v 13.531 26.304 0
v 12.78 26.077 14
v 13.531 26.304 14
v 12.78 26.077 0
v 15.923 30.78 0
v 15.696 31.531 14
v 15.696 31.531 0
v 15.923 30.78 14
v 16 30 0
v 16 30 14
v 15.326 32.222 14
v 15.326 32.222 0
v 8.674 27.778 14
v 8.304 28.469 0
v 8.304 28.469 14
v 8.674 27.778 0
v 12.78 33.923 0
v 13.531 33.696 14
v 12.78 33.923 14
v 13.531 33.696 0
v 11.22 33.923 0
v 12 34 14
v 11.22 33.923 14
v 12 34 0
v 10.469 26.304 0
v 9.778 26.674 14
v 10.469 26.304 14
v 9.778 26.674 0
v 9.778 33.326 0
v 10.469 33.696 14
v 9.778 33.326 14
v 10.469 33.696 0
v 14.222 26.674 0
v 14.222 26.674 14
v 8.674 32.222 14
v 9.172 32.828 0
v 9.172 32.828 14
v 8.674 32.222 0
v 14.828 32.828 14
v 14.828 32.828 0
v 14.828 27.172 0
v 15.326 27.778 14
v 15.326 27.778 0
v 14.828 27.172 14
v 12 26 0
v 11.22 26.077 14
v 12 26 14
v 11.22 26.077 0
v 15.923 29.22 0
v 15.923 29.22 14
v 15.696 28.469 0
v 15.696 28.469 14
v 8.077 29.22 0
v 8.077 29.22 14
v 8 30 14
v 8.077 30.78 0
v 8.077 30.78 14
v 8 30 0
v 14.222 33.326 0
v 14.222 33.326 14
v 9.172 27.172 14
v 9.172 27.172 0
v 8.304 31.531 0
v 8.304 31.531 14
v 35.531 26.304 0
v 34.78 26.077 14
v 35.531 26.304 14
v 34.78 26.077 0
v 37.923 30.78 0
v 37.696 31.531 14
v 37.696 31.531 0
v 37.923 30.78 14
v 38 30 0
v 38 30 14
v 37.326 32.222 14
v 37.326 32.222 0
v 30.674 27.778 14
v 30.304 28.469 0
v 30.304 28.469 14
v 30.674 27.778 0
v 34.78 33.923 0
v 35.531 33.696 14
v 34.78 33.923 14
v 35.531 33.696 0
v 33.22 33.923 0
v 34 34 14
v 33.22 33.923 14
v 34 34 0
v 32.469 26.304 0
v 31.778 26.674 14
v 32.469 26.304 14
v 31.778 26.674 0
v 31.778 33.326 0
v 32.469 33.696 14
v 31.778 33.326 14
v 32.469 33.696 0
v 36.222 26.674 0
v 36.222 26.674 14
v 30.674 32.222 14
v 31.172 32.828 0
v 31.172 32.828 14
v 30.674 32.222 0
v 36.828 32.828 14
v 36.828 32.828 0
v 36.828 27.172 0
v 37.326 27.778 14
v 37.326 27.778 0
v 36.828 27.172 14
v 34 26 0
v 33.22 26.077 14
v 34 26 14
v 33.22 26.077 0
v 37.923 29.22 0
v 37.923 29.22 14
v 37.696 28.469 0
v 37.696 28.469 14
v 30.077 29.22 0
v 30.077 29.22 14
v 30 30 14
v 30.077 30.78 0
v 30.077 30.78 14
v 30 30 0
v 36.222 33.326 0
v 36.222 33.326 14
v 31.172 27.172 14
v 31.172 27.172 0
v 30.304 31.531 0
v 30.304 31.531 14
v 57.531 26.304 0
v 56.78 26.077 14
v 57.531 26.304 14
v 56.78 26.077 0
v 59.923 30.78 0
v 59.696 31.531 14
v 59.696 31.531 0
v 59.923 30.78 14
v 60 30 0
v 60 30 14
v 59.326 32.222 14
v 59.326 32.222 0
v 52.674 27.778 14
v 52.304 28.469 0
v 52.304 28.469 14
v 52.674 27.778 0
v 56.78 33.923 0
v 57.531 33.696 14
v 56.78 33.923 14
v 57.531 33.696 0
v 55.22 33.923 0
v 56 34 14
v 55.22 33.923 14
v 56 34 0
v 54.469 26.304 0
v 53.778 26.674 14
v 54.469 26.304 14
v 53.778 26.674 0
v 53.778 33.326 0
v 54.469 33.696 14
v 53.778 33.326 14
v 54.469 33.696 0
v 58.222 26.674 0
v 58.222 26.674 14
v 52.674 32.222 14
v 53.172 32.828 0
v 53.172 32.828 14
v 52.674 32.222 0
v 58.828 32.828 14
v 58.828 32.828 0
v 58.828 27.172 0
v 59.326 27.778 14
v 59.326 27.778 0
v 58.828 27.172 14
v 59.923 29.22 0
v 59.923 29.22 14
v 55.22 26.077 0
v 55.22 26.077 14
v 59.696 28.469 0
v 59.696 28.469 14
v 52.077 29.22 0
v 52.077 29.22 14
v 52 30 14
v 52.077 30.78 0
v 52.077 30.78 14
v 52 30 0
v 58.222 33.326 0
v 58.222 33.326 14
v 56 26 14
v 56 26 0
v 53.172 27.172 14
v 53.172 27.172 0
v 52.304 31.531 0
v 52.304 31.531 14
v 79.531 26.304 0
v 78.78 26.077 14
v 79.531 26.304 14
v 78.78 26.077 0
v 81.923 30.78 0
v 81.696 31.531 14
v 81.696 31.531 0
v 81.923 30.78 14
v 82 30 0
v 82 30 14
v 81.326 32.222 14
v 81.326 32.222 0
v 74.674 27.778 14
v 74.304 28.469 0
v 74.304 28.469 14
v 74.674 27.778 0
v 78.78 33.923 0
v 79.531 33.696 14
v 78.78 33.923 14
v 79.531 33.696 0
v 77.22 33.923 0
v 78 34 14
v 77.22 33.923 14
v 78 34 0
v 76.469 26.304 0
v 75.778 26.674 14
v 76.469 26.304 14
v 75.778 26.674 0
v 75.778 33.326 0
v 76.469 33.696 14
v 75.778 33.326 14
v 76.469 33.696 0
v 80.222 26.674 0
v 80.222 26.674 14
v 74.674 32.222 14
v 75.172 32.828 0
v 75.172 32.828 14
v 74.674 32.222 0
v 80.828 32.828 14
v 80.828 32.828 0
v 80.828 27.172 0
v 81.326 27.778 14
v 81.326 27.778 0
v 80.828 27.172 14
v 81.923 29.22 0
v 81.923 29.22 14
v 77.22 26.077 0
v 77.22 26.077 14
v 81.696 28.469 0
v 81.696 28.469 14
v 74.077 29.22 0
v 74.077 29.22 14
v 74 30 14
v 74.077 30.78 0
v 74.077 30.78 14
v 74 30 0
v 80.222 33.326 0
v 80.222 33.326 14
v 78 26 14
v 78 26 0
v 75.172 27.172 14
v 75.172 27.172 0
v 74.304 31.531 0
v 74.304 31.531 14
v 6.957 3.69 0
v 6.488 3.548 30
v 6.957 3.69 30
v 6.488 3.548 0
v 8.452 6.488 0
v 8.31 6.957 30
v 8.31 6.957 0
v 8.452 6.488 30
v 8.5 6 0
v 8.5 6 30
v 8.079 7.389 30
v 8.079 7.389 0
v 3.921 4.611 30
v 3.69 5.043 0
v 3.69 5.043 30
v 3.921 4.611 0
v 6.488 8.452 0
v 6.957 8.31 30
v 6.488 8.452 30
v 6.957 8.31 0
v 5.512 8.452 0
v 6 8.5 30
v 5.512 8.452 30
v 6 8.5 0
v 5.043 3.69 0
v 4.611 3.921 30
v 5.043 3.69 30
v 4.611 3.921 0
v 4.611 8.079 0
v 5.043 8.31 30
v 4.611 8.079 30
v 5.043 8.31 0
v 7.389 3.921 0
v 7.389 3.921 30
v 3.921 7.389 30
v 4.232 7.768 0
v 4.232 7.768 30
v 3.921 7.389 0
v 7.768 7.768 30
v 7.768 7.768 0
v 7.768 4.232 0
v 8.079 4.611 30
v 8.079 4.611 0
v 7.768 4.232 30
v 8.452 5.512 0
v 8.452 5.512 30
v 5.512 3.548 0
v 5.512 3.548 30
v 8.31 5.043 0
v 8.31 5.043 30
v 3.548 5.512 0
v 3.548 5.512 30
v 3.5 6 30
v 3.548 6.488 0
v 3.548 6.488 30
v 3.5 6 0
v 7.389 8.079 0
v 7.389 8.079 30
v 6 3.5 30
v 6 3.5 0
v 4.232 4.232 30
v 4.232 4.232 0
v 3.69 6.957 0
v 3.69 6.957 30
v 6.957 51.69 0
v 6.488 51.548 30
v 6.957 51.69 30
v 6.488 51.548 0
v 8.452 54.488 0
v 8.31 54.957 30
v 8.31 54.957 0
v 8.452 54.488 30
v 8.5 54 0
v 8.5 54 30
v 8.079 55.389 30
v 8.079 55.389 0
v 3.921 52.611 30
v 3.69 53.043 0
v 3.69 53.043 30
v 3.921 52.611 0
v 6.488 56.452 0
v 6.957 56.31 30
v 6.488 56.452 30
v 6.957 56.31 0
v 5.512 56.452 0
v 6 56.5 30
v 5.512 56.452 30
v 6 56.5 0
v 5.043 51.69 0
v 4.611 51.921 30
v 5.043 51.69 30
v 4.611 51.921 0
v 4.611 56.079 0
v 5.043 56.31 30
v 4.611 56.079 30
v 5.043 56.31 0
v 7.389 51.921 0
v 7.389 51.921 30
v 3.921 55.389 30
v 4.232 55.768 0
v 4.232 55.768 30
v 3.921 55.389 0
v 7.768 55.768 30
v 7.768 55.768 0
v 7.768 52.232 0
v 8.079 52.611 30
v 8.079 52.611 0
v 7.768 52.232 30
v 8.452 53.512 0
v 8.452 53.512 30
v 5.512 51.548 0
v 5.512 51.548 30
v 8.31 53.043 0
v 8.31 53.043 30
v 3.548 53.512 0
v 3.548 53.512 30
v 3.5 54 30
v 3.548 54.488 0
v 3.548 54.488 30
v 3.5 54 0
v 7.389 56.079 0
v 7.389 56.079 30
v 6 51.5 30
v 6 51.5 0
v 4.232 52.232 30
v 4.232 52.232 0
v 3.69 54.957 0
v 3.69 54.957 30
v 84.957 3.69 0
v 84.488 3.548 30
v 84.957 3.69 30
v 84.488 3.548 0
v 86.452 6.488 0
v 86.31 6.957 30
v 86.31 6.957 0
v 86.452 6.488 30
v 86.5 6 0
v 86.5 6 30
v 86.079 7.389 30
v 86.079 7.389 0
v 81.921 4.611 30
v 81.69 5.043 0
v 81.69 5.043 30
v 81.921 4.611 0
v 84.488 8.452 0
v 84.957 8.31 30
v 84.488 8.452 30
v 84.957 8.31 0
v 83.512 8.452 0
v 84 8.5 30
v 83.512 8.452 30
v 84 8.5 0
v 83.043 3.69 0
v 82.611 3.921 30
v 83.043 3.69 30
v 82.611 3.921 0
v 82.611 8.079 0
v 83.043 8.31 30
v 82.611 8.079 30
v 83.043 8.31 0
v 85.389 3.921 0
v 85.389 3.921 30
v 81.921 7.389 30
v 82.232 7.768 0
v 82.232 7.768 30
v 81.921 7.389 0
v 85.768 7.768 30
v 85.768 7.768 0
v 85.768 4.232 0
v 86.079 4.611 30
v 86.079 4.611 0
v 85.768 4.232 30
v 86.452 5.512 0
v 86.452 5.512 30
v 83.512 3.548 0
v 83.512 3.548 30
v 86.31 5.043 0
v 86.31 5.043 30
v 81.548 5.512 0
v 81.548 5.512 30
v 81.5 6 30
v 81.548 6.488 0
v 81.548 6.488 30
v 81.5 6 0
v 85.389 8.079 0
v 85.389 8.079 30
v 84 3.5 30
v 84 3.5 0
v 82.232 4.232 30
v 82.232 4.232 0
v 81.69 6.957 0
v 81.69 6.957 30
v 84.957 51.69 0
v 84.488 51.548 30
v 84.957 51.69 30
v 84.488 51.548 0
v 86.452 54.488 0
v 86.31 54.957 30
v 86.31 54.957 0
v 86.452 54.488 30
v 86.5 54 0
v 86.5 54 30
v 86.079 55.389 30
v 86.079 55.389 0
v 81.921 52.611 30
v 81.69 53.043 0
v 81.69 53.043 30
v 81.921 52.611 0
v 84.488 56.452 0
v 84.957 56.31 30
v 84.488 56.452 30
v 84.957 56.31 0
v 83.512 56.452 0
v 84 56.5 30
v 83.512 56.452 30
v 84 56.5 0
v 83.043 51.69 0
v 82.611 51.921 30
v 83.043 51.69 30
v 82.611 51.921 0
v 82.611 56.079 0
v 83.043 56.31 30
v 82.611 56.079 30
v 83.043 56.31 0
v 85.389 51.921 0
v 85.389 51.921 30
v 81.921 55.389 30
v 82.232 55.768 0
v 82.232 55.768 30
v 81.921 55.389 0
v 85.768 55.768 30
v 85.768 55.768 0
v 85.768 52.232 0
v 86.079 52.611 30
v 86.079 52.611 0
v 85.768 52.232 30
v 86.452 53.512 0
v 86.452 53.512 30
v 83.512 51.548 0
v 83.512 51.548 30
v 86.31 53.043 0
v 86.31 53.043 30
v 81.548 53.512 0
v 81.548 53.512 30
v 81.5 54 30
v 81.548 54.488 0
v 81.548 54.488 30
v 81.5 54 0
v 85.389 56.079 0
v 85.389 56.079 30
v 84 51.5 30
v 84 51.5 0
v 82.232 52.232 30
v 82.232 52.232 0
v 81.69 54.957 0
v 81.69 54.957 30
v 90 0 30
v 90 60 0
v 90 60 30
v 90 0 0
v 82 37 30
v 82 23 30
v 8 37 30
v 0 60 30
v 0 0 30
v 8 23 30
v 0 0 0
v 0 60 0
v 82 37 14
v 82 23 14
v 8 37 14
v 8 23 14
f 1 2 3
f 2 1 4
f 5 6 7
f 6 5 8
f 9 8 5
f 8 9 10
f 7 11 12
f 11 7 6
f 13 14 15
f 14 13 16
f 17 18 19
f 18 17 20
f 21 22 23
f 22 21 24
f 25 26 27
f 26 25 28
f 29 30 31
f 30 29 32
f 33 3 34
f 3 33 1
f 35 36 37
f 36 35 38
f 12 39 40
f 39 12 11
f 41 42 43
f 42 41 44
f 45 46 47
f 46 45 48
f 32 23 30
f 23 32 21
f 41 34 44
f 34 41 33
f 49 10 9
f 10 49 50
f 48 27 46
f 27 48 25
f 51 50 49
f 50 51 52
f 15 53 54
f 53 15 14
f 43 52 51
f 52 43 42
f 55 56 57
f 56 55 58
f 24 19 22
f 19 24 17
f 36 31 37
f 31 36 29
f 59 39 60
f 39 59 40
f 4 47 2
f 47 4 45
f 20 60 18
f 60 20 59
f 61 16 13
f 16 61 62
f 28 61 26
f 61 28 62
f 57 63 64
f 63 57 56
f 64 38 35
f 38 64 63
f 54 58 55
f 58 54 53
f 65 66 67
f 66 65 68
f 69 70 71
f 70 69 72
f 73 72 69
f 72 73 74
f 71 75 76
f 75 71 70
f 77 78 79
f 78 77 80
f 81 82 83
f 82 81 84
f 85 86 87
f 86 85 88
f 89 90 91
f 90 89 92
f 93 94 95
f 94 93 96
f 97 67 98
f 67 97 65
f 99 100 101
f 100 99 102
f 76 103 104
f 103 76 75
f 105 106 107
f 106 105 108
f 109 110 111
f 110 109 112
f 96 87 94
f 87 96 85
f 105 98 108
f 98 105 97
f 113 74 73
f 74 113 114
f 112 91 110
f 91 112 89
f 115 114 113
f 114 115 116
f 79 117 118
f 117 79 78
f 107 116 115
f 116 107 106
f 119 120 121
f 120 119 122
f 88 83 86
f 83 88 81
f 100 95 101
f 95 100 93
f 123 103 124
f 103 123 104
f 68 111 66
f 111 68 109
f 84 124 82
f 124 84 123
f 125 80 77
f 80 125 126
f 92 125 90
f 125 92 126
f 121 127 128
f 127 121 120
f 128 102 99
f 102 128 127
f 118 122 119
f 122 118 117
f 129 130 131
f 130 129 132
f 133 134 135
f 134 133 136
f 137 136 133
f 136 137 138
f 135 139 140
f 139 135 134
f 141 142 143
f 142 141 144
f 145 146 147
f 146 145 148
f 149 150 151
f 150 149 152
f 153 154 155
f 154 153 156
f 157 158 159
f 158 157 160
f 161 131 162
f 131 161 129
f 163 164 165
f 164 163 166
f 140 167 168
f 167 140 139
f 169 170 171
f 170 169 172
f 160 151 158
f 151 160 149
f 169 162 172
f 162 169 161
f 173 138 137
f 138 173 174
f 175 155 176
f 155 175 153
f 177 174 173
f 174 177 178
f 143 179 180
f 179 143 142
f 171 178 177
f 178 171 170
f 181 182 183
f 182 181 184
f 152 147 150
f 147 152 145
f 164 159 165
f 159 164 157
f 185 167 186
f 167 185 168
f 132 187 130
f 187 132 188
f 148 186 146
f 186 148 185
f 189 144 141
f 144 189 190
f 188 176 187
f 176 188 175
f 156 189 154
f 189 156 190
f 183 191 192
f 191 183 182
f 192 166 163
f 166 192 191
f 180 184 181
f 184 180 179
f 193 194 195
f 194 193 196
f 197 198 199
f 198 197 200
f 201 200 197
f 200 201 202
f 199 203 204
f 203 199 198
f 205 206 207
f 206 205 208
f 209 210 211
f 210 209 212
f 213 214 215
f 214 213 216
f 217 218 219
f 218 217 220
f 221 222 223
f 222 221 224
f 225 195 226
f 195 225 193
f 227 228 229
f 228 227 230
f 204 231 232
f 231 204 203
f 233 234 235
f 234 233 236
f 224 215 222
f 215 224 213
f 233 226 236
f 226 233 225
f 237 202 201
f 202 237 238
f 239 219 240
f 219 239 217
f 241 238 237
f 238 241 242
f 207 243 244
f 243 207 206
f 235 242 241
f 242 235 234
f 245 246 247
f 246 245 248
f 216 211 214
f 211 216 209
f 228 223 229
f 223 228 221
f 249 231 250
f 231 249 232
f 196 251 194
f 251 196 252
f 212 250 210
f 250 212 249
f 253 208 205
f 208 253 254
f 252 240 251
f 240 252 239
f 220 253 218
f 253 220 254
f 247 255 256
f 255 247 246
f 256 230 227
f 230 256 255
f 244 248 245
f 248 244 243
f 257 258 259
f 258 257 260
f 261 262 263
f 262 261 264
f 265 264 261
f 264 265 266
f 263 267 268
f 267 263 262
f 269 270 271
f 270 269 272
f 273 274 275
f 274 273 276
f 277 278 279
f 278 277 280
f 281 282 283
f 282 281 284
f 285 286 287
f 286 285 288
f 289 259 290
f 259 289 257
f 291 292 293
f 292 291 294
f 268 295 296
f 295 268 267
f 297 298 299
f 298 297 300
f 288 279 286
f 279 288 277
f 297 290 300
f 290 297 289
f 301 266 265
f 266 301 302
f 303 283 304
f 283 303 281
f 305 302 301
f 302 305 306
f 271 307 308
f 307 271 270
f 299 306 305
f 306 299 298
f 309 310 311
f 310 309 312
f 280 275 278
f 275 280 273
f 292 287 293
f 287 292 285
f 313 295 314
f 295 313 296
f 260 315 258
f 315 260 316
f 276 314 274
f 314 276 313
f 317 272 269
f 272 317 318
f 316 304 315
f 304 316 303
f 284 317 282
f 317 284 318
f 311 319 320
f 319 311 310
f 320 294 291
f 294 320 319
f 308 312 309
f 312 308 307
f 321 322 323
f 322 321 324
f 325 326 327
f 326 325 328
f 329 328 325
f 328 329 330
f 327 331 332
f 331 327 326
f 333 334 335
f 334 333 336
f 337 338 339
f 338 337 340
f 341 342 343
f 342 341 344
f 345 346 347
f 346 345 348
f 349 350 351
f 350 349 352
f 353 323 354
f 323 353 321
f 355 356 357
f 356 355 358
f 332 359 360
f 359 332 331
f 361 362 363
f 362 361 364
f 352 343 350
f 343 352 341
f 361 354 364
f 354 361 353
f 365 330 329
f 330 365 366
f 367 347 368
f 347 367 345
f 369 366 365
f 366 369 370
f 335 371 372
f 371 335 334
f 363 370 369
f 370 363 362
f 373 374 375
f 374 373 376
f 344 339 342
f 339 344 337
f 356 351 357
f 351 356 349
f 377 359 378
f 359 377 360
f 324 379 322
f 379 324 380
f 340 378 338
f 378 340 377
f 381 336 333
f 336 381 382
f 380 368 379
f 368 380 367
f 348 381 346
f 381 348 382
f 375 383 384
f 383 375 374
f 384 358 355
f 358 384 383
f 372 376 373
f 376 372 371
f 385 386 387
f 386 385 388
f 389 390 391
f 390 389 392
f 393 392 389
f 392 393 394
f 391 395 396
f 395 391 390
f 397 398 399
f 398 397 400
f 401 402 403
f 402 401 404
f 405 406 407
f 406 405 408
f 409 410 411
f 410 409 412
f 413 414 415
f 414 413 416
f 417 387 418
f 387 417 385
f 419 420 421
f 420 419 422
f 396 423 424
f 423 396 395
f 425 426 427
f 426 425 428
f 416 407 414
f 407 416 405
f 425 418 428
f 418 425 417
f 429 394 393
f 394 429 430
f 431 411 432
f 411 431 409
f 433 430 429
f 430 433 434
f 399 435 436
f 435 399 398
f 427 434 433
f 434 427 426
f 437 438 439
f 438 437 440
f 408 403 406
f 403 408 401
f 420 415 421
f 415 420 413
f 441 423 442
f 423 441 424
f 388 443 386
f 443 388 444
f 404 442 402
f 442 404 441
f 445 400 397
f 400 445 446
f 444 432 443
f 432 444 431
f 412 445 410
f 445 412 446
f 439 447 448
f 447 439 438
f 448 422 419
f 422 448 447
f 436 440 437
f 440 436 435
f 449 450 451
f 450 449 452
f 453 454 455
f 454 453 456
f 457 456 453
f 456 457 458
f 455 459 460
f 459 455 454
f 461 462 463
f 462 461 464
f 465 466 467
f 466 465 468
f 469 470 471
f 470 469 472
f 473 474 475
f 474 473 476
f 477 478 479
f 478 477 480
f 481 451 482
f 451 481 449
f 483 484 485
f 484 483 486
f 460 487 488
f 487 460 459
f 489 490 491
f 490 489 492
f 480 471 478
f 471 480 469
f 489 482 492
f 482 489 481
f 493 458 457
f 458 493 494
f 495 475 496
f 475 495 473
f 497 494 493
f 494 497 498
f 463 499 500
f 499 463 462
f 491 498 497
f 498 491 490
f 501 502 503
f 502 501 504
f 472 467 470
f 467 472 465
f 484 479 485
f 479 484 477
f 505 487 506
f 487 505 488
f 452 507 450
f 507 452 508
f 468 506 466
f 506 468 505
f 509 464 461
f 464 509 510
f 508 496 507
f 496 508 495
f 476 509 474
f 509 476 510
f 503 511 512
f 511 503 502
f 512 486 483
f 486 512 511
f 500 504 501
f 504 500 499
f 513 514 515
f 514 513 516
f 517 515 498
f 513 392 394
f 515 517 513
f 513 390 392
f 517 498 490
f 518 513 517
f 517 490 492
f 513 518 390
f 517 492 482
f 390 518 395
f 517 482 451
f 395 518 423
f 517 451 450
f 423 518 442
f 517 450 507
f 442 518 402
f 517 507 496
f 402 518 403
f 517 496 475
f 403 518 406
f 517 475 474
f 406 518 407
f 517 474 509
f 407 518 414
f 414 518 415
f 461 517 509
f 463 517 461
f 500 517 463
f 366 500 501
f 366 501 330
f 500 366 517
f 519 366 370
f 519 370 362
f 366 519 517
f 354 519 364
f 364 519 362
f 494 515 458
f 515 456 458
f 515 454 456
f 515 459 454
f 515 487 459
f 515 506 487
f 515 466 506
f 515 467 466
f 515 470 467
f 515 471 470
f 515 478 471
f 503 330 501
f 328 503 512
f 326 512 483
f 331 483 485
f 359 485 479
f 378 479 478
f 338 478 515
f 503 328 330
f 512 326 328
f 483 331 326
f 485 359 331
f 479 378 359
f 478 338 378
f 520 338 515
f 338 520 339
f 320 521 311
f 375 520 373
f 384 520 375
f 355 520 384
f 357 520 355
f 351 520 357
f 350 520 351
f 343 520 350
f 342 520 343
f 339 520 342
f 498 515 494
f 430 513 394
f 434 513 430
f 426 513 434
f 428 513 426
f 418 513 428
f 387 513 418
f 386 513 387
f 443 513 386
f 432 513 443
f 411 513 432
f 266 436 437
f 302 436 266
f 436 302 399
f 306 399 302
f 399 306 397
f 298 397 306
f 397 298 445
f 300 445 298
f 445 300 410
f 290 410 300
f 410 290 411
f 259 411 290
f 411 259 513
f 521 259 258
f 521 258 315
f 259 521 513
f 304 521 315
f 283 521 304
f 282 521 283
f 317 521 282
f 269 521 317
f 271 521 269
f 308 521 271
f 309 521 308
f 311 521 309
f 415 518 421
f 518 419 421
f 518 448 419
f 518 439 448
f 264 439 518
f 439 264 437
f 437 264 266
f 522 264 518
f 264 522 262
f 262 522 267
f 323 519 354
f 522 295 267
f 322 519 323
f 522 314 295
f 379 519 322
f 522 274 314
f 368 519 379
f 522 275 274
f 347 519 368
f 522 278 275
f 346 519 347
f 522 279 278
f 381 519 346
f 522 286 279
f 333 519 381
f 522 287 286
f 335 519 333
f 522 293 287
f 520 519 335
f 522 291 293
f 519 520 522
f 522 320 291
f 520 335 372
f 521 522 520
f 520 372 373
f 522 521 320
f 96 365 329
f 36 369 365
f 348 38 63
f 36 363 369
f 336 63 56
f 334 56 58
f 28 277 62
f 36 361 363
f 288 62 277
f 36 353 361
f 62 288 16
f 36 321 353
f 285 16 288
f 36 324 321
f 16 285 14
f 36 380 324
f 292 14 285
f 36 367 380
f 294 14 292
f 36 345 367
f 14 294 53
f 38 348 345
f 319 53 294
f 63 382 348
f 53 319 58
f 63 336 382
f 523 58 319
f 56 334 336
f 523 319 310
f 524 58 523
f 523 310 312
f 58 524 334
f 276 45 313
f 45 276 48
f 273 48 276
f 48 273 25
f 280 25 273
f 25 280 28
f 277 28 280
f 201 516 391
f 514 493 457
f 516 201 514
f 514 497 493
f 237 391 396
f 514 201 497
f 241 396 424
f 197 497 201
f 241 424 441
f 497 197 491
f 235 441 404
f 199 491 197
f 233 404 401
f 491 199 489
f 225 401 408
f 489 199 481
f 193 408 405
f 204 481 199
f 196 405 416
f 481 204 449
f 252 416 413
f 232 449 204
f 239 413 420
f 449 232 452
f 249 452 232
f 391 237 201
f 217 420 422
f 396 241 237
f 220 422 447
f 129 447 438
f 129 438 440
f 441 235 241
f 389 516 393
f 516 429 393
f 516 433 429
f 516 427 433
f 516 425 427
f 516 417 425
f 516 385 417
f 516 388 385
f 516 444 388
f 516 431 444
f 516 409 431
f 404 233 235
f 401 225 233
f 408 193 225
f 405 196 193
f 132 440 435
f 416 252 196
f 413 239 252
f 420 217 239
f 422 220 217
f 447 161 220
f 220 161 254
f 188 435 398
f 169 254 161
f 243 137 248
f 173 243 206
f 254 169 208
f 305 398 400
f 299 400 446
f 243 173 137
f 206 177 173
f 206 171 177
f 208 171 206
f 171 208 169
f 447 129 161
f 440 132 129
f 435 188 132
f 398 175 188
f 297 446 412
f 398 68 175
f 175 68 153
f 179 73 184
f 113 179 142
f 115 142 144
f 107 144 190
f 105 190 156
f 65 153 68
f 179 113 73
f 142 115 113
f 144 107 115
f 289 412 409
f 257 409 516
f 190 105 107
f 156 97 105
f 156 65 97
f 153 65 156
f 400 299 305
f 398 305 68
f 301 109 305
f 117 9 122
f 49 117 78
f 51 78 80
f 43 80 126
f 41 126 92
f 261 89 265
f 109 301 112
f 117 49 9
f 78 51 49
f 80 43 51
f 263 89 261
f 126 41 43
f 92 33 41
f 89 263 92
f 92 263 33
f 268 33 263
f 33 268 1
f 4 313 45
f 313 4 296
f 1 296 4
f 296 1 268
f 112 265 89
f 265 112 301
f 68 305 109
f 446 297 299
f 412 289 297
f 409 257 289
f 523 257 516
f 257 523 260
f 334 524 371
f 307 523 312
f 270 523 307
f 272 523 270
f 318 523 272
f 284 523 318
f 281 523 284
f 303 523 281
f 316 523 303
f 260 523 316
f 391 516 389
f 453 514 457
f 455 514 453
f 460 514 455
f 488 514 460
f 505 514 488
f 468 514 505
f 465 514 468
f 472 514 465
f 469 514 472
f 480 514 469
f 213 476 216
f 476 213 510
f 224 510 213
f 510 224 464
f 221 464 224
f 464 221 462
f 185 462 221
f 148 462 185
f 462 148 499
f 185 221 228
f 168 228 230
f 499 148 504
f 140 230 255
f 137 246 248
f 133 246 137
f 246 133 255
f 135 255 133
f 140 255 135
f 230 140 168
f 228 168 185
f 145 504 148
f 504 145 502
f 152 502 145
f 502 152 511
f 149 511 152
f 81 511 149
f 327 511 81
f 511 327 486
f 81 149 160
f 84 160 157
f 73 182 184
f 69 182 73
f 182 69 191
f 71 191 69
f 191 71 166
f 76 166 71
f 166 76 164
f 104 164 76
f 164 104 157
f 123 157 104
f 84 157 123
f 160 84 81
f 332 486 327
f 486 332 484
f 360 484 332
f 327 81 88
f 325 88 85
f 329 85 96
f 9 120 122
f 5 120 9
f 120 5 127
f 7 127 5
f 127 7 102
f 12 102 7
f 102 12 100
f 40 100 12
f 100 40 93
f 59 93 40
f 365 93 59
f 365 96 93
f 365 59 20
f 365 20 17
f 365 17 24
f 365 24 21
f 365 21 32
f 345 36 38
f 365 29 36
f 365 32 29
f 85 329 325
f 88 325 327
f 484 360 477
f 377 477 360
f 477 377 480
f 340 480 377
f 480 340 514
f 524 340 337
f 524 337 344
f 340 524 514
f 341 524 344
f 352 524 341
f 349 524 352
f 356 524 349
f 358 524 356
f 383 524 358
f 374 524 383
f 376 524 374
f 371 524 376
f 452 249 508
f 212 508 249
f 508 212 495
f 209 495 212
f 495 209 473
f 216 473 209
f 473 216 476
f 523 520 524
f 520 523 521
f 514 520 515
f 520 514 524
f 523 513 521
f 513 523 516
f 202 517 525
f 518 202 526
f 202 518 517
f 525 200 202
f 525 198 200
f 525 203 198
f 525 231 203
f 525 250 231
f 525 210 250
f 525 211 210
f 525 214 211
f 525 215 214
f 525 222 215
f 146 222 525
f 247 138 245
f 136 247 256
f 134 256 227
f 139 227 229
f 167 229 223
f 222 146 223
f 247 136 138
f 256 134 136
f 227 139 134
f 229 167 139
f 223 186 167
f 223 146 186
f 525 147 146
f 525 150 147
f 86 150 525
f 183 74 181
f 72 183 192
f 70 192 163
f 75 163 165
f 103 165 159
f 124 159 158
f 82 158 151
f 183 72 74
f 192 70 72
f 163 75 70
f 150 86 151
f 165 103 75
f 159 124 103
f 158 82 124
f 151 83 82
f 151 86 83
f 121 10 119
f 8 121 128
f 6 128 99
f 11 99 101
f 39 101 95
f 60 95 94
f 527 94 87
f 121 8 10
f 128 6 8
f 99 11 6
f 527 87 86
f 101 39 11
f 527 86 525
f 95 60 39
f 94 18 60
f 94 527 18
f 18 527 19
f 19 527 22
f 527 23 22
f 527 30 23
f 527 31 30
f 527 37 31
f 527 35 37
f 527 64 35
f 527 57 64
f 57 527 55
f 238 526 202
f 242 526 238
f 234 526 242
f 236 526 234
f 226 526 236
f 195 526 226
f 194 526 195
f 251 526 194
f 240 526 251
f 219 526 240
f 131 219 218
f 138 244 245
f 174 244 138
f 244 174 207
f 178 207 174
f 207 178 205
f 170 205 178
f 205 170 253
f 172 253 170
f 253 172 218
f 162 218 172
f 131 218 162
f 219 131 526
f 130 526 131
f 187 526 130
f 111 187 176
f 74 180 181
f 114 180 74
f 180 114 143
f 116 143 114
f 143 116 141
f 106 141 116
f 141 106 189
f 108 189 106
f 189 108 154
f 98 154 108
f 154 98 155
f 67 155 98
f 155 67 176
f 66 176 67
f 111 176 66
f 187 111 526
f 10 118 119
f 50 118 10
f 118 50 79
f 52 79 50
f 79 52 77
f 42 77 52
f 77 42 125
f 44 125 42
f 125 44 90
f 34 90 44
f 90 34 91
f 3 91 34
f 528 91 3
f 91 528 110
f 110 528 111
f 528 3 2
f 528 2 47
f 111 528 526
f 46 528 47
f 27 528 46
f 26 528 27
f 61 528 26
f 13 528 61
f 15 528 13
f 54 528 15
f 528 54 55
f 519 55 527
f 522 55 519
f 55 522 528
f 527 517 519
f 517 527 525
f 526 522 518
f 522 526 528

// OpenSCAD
$fn = 32;

// ----------------------------------------------------------------------
// Manifold block: gallery_top manifold
// ----------------------------------------------------------------------

// --- parameters (mm) ---
block_l = 90;             // block length, X
block_w = 60;             // block width, Y
block_h = 30;             // block height, Z
port_d = 8;               // port bore diameter
port_pitch = 22;          // port pitch along X
gallery_d = 14;           // top gallery width, Y
gallery_depth = 16;       // gallery pocket depth
wall_p = 8;               // gallery end wall thickness, X
mnt_d = 5;                // mounting hole diameter
mnt_in = 6;               // mounting hole inset from the edges

n_ports = 4;  // ports in the row
port_x0 = (block_l - (n_ports - 1) * port_pitch) / 2;  // first port X

difference() {
  cube([block_l, block_w, block_h]);
  for (i = [0 : n_ports - 1])
    translate([port_x0 + i * port_pitch, block_w / 2, -1])
      cylinder(h = block_h + 2, d = port_d);
  translate([wall_p, block_w / 2 - gallery_d / 2, block_h - gallery_depth])
    cube([block_l - 2 * wall_p, gallery_d, gallery_depth + 1]);
  for (cx = [mnt_in, block_l - mnt_in])
    for (cy = [mnt_in, block_w - mnt_in])
      translate([cx, cy, -1]) cylinder(h = block_h + 2, d = mnt_d);
}
